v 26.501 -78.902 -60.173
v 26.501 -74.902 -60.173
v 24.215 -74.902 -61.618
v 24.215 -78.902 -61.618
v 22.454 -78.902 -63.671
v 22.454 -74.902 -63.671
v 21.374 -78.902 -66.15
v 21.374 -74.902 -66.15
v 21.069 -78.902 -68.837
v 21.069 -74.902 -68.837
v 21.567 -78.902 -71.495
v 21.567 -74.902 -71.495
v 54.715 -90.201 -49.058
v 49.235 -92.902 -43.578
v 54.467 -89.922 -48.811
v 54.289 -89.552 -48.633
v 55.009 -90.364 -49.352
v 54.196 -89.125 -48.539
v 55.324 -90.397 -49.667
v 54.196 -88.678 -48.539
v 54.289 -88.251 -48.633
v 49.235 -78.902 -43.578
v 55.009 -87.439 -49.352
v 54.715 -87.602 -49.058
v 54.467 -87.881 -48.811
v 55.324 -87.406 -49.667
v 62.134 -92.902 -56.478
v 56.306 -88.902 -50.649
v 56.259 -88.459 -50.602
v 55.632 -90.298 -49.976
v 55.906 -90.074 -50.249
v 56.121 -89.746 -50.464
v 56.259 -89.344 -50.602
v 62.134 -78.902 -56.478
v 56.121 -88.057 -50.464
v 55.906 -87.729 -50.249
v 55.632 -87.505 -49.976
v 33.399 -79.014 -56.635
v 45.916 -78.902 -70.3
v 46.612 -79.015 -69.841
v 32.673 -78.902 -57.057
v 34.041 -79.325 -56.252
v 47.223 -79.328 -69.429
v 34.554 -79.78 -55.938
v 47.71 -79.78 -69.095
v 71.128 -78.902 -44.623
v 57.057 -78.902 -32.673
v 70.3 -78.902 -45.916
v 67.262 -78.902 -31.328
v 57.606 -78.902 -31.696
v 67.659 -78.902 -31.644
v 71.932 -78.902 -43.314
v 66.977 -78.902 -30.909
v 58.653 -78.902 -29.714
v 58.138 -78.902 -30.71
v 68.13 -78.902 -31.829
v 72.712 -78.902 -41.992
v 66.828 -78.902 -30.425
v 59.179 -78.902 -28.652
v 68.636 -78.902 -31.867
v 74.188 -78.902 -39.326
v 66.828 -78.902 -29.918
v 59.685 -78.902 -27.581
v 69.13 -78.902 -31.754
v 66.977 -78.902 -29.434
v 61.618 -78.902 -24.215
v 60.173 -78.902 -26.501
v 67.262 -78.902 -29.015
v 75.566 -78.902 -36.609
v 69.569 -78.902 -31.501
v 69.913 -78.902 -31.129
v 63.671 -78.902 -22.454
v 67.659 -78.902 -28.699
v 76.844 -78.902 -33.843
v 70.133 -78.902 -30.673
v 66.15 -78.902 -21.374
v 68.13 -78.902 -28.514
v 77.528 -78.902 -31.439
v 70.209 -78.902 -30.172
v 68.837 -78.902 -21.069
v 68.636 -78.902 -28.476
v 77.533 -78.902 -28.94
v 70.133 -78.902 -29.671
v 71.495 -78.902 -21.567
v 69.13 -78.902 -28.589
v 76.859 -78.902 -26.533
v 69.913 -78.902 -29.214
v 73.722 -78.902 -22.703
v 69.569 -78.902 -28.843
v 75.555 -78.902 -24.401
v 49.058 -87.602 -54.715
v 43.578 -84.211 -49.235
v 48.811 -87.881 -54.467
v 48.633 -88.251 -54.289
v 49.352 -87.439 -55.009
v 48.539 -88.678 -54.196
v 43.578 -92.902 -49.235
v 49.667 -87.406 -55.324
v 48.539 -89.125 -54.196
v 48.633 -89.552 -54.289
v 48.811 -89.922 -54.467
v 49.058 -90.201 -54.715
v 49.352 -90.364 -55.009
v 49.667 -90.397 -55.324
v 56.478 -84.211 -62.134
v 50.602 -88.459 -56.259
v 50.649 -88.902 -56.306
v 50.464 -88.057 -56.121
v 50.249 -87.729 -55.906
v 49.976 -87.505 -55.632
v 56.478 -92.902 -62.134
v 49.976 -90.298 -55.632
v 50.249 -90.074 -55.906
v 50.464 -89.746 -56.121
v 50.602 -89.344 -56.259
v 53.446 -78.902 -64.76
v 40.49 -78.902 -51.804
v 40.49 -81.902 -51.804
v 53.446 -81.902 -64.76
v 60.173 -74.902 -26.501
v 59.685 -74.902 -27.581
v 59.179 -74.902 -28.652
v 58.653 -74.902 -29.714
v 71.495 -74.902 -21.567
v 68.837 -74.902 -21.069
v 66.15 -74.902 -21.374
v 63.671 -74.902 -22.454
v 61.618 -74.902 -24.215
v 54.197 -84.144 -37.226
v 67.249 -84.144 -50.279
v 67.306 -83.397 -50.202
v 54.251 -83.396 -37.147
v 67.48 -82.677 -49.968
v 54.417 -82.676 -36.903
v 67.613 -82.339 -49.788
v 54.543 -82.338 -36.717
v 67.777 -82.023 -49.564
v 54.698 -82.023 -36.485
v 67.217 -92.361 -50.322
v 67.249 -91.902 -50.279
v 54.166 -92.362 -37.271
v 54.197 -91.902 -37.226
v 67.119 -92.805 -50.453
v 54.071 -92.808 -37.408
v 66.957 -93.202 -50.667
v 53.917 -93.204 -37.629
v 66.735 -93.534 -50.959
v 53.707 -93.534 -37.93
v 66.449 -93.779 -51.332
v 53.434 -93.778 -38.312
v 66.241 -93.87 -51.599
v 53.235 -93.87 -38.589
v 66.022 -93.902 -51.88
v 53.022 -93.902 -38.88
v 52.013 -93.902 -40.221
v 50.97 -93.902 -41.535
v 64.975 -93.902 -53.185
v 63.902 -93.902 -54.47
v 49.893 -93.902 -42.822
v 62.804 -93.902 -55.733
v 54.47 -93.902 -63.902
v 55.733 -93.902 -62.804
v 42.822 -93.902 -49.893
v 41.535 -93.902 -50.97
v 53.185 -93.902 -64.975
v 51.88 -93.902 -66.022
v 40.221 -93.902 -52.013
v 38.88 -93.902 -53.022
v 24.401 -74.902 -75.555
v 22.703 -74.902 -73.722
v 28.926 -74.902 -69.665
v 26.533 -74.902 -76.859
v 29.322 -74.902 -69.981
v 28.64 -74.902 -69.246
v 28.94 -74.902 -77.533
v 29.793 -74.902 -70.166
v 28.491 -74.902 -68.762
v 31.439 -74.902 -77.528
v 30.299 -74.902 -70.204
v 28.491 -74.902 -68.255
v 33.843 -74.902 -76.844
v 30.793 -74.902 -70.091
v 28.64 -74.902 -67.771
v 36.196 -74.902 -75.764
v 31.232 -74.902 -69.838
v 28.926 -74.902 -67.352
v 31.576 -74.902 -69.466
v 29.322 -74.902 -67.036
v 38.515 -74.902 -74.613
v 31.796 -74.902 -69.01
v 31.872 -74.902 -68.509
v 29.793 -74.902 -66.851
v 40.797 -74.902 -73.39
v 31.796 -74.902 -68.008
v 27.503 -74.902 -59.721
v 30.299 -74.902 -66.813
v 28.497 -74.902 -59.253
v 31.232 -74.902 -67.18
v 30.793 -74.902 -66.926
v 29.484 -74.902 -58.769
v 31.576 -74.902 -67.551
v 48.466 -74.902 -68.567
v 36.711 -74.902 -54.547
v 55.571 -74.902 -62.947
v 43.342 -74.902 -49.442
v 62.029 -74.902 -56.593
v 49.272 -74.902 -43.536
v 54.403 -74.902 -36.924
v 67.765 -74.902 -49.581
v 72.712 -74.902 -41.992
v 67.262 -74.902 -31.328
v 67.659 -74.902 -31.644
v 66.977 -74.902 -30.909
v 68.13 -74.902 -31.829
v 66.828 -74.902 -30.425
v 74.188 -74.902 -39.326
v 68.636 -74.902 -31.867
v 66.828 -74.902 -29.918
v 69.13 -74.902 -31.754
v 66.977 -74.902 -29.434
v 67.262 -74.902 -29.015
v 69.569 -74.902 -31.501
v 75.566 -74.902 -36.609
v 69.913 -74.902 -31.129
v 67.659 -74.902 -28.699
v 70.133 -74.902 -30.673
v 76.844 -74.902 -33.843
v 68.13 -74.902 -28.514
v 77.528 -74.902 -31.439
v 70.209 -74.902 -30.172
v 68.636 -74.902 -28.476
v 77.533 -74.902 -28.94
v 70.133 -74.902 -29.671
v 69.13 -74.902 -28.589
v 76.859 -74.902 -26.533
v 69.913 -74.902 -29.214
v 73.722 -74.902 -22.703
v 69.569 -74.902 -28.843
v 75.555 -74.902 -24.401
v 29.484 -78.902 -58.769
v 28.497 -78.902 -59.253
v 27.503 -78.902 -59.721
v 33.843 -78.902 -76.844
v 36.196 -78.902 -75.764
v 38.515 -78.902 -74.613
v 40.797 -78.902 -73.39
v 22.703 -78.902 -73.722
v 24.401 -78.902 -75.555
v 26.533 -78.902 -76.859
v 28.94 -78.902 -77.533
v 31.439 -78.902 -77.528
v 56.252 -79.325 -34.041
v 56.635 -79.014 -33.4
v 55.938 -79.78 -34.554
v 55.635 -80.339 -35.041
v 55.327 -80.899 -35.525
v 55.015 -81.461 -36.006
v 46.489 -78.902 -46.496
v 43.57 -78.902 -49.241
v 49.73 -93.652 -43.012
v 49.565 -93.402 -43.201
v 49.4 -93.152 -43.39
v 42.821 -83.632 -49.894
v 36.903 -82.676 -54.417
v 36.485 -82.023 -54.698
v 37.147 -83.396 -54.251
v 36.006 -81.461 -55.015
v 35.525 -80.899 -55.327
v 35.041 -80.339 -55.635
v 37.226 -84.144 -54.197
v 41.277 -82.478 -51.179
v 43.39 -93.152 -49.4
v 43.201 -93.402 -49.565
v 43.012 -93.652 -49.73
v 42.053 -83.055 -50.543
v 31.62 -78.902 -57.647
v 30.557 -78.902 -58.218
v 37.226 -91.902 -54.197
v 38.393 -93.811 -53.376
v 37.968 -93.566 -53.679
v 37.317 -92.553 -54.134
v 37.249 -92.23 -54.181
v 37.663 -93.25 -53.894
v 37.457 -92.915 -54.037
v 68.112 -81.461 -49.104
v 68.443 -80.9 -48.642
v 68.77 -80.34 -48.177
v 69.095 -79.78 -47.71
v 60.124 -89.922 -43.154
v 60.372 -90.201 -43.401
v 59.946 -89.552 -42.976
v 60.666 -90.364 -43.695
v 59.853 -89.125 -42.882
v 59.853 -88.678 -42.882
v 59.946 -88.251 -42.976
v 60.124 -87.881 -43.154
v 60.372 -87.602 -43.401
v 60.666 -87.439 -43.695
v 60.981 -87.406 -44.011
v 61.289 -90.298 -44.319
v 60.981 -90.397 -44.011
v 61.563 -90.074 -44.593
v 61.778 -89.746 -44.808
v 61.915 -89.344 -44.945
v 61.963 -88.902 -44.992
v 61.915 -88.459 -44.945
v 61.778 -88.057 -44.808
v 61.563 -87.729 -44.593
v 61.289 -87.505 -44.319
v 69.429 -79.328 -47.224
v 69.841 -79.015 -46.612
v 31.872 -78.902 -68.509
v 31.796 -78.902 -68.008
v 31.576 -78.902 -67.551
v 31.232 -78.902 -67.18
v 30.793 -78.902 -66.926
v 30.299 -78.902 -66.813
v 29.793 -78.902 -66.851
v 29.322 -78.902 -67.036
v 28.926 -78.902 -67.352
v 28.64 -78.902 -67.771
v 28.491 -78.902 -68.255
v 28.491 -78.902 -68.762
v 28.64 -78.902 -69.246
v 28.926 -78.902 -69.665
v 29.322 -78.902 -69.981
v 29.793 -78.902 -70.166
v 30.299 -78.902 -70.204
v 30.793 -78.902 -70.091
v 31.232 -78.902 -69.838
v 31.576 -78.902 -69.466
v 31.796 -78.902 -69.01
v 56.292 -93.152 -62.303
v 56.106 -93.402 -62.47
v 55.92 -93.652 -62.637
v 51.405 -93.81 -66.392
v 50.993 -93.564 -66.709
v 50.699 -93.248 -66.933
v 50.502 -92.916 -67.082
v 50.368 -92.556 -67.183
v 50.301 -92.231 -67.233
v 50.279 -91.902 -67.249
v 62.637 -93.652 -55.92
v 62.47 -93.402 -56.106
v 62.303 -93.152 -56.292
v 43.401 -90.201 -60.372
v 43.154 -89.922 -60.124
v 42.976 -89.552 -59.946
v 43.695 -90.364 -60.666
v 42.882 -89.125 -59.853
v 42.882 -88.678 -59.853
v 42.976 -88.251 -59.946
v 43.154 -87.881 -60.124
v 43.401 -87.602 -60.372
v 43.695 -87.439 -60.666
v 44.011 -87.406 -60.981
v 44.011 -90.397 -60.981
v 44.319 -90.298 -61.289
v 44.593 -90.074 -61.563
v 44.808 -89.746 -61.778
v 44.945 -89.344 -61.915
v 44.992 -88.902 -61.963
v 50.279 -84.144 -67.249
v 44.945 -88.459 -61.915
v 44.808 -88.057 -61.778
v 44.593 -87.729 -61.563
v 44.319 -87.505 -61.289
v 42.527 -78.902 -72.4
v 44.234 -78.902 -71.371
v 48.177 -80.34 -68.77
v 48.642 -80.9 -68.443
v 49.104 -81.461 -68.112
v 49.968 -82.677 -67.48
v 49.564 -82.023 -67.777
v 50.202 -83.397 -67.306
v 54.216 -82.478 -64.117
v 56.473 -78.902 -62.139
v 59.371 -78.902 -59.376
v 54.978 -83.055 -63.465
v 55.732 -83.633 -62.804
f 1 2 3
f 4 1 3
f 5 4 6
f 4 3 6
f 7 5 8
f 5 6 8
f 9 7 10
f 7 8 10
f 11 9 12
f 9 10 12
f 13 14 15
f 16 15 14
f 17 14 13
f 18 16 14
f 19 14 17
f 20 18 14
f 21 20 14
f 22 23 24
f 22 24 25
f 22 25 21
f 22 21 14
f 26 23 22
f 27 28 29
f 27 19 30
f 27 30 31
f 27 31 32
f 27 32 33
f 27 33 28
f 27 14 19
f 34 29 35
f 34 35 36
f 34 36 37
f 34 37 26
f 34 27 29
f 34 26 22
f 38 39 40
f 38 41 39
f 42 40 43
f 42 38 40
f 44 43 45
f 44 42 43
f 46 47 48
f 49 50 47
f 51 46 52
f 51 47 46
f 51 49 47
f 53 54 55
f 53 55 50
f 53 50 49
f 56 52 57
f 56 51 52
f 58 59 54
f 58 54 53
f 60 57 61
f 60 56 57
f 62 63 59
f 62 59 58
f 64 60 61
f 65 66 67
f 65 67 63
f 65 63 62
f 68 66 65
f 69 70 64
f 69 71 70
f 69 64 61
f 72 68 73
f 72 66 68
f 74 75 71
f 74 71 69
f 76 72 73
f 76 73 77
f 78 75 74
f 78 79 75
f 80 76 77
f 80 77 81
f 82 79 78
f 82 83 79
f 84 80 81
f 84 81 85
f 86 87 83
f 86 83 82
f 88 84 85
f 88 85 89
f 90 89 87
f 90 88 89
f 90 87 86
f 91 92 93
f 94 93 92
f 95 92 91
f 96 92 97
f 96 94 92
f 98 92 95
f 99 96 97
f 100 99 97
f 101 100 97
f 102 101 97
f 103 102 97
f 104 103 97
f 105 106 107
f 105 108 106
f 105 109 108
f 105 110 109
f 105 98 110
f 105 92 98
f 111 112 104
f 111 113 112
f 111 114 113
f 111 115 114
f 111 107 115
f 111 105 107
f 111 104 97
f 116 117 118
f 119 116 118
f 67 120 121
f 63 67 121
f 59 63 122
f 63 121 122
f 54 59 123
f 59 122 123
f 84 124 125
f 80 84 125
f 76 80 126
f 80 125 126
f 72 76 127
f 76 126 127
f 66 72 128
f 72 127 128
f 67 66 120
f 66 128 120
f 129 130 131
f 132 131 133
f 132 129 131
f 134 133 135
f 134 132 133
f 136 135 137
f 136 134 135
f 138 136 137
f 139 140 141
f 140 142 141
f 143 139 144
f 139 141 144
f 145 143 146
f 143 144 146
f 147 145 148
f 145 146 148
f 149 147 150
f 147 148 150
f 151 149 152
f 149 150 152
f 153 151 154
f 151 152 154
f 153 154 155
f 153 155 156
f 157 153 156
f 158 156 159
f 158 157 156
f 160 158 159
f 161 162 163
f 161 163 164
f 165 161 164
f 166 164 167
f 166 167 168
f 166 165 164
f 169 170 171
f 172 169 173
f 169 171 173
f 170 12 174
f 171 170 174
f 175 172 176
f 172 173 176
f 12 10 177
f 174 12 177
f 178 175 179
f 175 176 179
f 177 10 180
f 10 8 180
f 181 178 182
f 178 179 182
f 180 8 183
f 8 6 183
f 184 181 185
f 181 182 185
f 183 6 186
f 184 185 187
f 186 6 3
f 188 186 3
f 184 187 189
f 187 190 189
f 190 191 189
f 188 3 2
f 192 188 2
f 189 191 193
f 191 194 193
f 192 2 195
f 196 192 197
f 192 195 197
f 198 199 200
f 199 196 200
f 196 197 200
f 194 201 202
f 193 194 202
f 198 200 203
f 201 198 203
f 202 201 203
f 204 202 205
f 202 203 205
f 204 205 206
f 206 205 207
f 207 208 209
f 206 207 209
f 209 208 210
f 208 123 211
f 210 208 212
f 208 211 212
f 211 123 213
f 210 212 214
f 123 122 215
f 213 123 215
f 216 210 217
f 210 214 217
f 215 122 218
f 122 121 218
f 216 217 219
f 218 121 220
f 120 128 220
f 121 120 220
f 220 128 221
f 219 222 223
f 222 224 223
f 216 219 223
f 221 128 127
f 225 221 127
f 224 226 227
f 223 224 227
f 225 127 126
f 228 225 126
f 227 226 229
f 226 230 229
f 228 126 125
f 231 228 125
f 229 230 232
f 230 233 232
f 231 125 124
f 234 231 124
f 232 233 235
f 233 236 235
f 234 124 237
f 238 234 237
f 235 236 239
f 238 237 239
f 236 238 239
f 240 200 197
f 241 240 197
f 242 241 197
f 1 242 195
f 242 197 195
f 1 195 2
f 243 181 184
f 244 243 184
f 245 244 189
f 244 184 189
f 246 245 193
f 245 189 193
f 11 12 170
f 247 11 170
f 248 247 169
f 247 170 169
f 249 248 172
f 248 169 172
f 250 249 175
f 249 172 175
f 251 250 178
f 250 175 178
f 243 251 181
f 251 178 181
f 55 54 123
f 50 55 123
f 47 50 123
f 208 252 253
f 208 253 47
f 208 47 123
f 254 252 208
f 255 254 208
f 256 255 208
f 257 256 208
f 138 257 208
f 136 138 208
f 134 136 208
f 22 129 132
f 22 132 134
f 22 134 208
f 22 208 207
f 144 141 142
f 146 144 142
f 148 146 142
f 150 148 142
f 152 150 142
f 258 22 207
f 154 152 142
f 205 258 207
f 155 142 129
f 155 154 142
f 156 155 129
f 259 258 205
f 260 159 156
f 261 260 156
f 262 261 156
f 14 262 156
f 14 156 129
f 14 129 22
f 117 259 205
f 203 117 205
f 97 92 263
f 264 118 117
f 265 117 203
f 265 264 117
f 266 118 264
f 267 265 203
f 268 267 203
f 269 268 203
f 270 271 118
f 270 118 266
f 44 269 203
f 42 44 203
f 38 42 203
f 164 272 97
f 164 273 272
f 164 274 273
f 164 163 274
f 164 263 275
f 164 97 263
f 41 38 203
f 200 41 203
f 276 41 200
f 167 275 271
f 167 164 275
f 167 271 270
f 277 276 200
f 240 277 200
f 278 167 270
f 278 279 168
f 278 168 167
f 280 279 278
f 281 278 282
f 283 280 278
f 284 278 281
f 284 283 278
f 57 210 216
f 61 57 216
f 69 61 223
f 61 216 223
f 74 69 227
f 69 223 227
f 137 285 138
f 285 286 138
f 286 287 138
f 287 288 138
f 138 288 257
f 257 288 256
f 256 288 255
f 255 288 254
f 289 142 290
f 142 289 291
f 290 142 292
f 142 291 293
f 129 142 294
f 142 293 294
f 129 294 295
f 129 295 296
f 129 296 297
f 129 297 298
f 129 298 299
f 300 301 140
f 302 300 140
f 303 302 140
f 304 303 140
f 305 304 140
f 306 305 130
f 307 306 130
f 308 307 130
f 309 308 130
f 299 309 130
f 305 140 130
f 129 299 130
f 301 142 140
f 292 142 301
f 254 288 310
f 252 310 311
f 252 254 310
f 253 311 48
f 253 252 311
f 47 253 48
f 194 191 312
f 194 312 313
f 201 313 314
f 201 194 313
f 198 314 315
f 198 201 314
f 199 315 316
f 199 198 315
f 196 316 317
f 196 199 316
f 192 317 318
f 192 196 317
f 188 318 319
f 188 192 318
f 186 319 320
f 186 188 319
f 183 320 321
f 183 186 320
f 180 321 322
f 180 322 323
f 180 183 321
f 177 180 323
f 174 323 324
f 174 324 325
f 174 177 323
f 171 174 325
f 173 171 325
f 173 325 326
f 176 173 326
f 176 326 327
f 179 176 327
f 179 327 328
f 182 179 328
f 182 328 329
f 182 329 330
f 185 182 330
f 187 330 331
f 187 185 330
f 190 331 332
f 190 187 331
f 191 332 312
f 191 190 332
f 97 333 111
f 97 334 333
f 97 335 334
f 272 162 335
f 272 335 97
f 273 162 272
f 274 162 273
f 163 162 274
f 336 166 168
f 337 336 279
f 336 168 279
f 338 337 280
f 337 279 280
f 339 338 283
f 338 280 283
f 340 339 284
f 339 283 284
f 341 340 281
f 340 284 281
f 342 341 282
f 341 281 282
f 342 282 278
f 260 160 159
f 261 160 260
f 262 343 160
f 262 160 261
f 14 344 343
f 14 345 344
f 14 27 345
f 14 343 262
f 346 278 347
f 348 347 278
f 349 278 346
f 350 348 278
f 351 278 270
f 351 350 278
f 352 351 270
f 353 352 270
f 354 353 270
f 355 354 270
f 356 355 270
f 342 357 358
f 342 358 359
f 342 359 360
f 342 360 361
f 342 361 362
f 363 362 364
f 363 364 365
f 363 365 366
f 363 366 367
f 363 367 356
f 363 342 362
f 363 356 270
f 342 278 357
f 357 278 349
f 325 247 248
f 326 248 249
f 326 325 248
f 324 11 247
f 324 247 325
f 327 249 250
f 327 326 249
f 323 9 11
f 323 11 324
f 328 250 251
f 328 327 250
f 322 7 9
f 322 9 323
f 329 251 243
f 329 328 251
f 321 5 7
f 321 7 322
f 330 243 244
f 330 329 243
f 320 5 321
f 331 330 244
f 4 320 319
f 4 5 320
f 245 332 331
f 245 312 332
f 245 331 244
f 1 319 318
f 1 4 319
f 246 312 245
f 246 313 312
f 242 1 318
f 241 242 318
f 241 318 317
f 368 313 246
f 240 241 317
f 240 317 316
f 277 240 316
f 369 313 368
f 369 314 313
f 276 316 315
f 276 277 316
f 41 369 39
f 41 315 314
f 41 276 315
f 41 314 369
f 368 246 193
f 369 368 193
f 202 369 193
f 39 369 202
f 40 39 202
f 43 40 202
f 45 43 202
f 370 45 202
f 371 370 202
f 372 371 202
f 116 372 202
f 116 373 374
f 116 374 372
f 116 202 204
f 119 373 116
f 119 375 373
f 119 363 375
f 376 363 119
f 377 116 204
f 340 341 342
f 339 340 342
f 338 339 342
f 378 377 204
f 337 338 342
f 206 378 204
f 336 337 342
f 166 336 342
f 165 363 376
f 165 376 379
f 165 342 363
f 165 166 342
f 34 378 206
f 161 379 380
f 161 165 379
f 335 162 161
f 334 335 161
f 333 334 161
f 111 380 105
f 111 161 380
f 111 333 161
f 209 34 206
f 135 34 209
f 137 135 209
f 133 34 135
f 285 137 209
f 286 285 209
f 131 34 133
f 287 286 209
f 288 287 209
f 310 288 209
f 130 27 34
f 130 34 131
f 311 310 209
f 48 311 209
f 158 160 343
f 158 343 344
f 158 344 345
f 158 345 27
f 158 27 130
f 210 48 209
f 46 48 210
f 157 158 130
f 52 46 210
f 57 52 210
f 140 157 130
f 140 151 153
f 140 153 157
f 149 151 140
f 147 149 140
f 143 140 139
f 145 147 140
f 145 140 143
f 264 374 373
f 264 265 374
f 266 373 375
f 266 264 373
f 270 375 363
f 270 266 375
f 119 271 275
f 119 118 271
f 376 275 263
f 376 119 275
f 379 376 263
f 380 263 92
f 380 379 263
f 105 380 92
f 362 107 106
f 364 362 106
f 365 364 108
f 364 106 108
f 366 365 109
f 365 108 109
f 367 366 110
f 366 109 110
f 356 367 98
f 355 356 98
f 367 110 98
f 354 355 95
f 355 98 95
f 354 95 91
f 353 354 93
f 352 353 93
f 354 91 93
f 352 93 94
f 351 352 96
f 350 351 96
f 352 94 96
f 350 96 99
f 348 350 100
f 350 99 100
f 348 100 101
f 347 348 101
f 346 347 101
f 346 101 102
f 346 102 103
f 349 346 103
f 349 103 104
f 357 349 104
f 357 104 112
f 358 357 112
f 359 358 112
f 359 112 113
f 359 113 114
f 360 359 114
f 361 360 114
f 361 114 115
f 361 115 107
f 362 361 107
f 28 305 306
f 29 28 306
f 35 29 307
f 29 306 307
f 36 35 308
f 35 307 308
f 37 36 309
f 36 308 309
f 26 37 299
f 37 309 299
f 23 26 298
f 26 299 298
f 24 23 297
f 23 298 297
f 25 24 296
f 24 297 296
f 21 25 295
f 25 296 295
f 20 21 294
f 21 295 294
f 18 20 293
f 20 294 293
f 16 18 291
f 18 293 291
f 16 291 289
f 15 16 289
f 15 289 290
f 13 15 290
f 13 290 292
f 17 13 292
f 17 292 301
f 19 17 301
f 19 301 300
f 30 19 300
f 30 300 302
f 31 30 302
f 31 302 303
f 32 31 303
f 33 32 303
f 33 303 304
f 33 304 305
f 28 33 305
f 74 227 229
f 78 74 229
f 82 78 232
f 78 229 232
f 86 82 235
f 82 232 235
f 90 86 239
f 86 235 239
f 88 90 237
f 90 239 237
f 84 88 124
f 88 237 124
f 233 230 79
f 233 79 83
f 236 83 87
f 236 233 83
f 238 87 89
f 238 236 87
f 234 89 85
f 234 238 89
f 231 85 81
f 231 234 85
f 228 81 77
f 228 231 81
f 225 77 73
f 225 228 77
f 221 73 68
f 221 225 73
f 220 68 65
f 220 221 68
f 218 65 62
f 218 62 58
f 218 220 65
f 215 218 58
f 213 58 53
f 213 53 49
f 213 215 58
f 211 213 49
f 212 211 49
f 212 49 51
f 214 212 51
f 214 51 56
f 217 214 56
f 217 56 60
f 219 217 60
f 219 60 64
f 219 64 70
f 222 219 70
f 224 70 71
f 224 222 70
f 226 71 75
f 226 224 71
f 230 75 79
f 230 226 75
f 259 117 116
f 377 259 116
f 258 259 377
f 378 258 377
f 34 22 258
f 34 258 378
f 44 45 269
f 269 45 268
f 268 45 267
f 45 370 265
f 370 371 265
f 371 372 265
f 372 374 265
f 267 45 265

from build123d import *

# Parameters (mm, degrees)
SKETCH1_R           = 1.7
BOSS_EXTRUDE1_DEPTH = 4
SKETCH2_W           = 8
SKETCH2_H           = 15
BOSS_EXTRUDE2_DEPTH = 30
CUT_EXTRUDE1_DEPTH  = 30
SKETCH4_R           = 1.5
CUT_EXTRUDE2_DEPTH  = 52.989471847
FILLET1_R           = 2
CHAMFER1_SIZE       = 1
CHAMFER2_SIZE       = 4
FILLET2_R           = 3


with BuildPart() as part:
    # Sketch1 → Boss-Extrude1 (new body)
    with BuildSketch(Plane.XZ.offset(74.901515315)):
        with BuildLine():
            ThreePointArc((21.566916187, -71.495231174), (26.53319413, -76.858714128), (33.842822155, -76.844426529))
            ThreePointArc((33.842822155, -76.844426529), (59.373405242, -59.373405242), (76.844426529, -33.842822155))
            ThreePointArc((76.844426529, -33.842822155), (76.858714128, -26.53319413), (71.495231174, -21.566916187))
            ThreePointArc((71.495231174, -21.566916187), (64.870172632, -21.821666174), (60.172932274, -26.500579645))
            ThreePointArc((60.172932274, -26.500579645), (46.492270863, -46.492270863), (26.500579645, -60.172932274))
            ThreePointArc((26.500579645, -60.172932274), (21.821666174, -64.870172632), (21.566916187, -71.495231174))
        make_face()
        with Locations((30.1717009, -68.508679402)):
            Circle(SKETCH1_R, mode=Mode.SUBTRACT)
        with Locations((68.508679402, -30.1717009)):
            Circle(SKETCH1_R, mode=Mode.SUBTRACT)
    extrude(amount=BOSS_EXTRUDE1_DEPTH)

    # Sketch2 → Boss-Extrude2 (add)
    with BuildSketch(Plane(origin=(62.280244247, 0, -62.280244247), x_dir=(-0.707106781, 0, -0.707106781), z_dir=(0.707106781, 0, -0.707106781))):
        with Locations((-8, -86.401515315)):
            Rectangle(SKETCH2_W, SKETCH2_H)
        Polygon((4, -93.901515315), (12, -93.901515315), (12, -78.901515315), (8, -78.901515315), (8, -81.901515315), (4, -84.210916392), align=None)
    extrude(amount=-BOSS_EXTRUDE2_DEPTH)

    # Sketch3 → Cut-Extrude1 (cut)
    with BuildSketch(Plane.XZ.offset(93.901515315)):
        with BuildLine():
            Line((29.484052126, -58.768641044), (22.062889108, -51.347478026))
            Line((22.062889108, -51.347478026), (52.677923164, -23.025448826))
            Line((52.677923164, -23.025448826), (58.652501829, -29.714416185))
            ThreePointArc((58.652501829, -29.714416185), (46.400970155, -46.583392627), (29.484052126, -58.768641044))
        make_face()
        with BuildLine():
            Line((72.712363398, -41.991840982), (86.447631041, -52.417601978))
            Line((86.447631041, -52.417601978), (48.404595932, -83.58162252))
            Line((48.404595932, -83.58162252), (40.796709535, -73.389583669))
            ThreePointArc((40.796709535, -73.389583669), (58.885753549, -59.857084201), (72.712363398, -41.991840982))
        make_face()
    extrude(amount=-CUT_EXTRUDE1_DEPTH, mode=Mode.SUBTRACT)

    # Sketch4 → Cut-Extrude2 (cut, through all)
    with BuildSketch(Plane(origin=(8.485281374, 0, 8.485281374), x_dir=(0.707106781, 0, -0.707106781), z_dir=(0.707106781, 0, 0.707106781))):
        with Locations((74.128214207, -88.901515315)):
            Circle(SKETCH4_R)
    extrude(amount=-CUT_EXTRUDE2_DEPTH, mode=Mode.SUBTRACT)

    # Fillet1
    fillet1_edges = [part.edges().sort_by_distance(p)[0] for p in [
        (43.752386609, -93.901515315, -60.722949357),
        (60.722949357, -93.901515315, -43.752386609),
    ]]
    fillet(fillet1_edges, radius=FILLET1_R)

    # Chamfer1
    chamfer1_edges = [part.edges().sort_by_distance(p)[0] for p in [
        (50.0276489, -93.901515315, -55.684503149),
        (55.684503149, -93.901515315, -50.0276489),
    ]]
    chamfer(chamfer1_edges, length=CHAMFER1_SIZE)

    # Chamfer2
    chamfer2_edges = [part.edges().sort_by_distance(p)[0] for p in [
        (60.722949357, -78.901515315, -43.752386609),
        (43.752386609, -78.901515315, -60.722949357),
    ]]
    chamfer(chamfer2_edges, length=CHAMFER2_SIZE)

    # Fillet2
    fillet2_edges = [part.edges().sort_by_distance(p)[0] for p in [
        (63.00381198, -78.901515315, -40.376394982),
        (60.722949357, -82.901515315, -43.752386609),
        (43.752386609, -82.901515315, -60.722949357),
        (40.376394982, -78.901515315, -63.00381198),
    ]]
    fillet(fillet2_edges, radius=FILLET2_R)


solid = part.part
